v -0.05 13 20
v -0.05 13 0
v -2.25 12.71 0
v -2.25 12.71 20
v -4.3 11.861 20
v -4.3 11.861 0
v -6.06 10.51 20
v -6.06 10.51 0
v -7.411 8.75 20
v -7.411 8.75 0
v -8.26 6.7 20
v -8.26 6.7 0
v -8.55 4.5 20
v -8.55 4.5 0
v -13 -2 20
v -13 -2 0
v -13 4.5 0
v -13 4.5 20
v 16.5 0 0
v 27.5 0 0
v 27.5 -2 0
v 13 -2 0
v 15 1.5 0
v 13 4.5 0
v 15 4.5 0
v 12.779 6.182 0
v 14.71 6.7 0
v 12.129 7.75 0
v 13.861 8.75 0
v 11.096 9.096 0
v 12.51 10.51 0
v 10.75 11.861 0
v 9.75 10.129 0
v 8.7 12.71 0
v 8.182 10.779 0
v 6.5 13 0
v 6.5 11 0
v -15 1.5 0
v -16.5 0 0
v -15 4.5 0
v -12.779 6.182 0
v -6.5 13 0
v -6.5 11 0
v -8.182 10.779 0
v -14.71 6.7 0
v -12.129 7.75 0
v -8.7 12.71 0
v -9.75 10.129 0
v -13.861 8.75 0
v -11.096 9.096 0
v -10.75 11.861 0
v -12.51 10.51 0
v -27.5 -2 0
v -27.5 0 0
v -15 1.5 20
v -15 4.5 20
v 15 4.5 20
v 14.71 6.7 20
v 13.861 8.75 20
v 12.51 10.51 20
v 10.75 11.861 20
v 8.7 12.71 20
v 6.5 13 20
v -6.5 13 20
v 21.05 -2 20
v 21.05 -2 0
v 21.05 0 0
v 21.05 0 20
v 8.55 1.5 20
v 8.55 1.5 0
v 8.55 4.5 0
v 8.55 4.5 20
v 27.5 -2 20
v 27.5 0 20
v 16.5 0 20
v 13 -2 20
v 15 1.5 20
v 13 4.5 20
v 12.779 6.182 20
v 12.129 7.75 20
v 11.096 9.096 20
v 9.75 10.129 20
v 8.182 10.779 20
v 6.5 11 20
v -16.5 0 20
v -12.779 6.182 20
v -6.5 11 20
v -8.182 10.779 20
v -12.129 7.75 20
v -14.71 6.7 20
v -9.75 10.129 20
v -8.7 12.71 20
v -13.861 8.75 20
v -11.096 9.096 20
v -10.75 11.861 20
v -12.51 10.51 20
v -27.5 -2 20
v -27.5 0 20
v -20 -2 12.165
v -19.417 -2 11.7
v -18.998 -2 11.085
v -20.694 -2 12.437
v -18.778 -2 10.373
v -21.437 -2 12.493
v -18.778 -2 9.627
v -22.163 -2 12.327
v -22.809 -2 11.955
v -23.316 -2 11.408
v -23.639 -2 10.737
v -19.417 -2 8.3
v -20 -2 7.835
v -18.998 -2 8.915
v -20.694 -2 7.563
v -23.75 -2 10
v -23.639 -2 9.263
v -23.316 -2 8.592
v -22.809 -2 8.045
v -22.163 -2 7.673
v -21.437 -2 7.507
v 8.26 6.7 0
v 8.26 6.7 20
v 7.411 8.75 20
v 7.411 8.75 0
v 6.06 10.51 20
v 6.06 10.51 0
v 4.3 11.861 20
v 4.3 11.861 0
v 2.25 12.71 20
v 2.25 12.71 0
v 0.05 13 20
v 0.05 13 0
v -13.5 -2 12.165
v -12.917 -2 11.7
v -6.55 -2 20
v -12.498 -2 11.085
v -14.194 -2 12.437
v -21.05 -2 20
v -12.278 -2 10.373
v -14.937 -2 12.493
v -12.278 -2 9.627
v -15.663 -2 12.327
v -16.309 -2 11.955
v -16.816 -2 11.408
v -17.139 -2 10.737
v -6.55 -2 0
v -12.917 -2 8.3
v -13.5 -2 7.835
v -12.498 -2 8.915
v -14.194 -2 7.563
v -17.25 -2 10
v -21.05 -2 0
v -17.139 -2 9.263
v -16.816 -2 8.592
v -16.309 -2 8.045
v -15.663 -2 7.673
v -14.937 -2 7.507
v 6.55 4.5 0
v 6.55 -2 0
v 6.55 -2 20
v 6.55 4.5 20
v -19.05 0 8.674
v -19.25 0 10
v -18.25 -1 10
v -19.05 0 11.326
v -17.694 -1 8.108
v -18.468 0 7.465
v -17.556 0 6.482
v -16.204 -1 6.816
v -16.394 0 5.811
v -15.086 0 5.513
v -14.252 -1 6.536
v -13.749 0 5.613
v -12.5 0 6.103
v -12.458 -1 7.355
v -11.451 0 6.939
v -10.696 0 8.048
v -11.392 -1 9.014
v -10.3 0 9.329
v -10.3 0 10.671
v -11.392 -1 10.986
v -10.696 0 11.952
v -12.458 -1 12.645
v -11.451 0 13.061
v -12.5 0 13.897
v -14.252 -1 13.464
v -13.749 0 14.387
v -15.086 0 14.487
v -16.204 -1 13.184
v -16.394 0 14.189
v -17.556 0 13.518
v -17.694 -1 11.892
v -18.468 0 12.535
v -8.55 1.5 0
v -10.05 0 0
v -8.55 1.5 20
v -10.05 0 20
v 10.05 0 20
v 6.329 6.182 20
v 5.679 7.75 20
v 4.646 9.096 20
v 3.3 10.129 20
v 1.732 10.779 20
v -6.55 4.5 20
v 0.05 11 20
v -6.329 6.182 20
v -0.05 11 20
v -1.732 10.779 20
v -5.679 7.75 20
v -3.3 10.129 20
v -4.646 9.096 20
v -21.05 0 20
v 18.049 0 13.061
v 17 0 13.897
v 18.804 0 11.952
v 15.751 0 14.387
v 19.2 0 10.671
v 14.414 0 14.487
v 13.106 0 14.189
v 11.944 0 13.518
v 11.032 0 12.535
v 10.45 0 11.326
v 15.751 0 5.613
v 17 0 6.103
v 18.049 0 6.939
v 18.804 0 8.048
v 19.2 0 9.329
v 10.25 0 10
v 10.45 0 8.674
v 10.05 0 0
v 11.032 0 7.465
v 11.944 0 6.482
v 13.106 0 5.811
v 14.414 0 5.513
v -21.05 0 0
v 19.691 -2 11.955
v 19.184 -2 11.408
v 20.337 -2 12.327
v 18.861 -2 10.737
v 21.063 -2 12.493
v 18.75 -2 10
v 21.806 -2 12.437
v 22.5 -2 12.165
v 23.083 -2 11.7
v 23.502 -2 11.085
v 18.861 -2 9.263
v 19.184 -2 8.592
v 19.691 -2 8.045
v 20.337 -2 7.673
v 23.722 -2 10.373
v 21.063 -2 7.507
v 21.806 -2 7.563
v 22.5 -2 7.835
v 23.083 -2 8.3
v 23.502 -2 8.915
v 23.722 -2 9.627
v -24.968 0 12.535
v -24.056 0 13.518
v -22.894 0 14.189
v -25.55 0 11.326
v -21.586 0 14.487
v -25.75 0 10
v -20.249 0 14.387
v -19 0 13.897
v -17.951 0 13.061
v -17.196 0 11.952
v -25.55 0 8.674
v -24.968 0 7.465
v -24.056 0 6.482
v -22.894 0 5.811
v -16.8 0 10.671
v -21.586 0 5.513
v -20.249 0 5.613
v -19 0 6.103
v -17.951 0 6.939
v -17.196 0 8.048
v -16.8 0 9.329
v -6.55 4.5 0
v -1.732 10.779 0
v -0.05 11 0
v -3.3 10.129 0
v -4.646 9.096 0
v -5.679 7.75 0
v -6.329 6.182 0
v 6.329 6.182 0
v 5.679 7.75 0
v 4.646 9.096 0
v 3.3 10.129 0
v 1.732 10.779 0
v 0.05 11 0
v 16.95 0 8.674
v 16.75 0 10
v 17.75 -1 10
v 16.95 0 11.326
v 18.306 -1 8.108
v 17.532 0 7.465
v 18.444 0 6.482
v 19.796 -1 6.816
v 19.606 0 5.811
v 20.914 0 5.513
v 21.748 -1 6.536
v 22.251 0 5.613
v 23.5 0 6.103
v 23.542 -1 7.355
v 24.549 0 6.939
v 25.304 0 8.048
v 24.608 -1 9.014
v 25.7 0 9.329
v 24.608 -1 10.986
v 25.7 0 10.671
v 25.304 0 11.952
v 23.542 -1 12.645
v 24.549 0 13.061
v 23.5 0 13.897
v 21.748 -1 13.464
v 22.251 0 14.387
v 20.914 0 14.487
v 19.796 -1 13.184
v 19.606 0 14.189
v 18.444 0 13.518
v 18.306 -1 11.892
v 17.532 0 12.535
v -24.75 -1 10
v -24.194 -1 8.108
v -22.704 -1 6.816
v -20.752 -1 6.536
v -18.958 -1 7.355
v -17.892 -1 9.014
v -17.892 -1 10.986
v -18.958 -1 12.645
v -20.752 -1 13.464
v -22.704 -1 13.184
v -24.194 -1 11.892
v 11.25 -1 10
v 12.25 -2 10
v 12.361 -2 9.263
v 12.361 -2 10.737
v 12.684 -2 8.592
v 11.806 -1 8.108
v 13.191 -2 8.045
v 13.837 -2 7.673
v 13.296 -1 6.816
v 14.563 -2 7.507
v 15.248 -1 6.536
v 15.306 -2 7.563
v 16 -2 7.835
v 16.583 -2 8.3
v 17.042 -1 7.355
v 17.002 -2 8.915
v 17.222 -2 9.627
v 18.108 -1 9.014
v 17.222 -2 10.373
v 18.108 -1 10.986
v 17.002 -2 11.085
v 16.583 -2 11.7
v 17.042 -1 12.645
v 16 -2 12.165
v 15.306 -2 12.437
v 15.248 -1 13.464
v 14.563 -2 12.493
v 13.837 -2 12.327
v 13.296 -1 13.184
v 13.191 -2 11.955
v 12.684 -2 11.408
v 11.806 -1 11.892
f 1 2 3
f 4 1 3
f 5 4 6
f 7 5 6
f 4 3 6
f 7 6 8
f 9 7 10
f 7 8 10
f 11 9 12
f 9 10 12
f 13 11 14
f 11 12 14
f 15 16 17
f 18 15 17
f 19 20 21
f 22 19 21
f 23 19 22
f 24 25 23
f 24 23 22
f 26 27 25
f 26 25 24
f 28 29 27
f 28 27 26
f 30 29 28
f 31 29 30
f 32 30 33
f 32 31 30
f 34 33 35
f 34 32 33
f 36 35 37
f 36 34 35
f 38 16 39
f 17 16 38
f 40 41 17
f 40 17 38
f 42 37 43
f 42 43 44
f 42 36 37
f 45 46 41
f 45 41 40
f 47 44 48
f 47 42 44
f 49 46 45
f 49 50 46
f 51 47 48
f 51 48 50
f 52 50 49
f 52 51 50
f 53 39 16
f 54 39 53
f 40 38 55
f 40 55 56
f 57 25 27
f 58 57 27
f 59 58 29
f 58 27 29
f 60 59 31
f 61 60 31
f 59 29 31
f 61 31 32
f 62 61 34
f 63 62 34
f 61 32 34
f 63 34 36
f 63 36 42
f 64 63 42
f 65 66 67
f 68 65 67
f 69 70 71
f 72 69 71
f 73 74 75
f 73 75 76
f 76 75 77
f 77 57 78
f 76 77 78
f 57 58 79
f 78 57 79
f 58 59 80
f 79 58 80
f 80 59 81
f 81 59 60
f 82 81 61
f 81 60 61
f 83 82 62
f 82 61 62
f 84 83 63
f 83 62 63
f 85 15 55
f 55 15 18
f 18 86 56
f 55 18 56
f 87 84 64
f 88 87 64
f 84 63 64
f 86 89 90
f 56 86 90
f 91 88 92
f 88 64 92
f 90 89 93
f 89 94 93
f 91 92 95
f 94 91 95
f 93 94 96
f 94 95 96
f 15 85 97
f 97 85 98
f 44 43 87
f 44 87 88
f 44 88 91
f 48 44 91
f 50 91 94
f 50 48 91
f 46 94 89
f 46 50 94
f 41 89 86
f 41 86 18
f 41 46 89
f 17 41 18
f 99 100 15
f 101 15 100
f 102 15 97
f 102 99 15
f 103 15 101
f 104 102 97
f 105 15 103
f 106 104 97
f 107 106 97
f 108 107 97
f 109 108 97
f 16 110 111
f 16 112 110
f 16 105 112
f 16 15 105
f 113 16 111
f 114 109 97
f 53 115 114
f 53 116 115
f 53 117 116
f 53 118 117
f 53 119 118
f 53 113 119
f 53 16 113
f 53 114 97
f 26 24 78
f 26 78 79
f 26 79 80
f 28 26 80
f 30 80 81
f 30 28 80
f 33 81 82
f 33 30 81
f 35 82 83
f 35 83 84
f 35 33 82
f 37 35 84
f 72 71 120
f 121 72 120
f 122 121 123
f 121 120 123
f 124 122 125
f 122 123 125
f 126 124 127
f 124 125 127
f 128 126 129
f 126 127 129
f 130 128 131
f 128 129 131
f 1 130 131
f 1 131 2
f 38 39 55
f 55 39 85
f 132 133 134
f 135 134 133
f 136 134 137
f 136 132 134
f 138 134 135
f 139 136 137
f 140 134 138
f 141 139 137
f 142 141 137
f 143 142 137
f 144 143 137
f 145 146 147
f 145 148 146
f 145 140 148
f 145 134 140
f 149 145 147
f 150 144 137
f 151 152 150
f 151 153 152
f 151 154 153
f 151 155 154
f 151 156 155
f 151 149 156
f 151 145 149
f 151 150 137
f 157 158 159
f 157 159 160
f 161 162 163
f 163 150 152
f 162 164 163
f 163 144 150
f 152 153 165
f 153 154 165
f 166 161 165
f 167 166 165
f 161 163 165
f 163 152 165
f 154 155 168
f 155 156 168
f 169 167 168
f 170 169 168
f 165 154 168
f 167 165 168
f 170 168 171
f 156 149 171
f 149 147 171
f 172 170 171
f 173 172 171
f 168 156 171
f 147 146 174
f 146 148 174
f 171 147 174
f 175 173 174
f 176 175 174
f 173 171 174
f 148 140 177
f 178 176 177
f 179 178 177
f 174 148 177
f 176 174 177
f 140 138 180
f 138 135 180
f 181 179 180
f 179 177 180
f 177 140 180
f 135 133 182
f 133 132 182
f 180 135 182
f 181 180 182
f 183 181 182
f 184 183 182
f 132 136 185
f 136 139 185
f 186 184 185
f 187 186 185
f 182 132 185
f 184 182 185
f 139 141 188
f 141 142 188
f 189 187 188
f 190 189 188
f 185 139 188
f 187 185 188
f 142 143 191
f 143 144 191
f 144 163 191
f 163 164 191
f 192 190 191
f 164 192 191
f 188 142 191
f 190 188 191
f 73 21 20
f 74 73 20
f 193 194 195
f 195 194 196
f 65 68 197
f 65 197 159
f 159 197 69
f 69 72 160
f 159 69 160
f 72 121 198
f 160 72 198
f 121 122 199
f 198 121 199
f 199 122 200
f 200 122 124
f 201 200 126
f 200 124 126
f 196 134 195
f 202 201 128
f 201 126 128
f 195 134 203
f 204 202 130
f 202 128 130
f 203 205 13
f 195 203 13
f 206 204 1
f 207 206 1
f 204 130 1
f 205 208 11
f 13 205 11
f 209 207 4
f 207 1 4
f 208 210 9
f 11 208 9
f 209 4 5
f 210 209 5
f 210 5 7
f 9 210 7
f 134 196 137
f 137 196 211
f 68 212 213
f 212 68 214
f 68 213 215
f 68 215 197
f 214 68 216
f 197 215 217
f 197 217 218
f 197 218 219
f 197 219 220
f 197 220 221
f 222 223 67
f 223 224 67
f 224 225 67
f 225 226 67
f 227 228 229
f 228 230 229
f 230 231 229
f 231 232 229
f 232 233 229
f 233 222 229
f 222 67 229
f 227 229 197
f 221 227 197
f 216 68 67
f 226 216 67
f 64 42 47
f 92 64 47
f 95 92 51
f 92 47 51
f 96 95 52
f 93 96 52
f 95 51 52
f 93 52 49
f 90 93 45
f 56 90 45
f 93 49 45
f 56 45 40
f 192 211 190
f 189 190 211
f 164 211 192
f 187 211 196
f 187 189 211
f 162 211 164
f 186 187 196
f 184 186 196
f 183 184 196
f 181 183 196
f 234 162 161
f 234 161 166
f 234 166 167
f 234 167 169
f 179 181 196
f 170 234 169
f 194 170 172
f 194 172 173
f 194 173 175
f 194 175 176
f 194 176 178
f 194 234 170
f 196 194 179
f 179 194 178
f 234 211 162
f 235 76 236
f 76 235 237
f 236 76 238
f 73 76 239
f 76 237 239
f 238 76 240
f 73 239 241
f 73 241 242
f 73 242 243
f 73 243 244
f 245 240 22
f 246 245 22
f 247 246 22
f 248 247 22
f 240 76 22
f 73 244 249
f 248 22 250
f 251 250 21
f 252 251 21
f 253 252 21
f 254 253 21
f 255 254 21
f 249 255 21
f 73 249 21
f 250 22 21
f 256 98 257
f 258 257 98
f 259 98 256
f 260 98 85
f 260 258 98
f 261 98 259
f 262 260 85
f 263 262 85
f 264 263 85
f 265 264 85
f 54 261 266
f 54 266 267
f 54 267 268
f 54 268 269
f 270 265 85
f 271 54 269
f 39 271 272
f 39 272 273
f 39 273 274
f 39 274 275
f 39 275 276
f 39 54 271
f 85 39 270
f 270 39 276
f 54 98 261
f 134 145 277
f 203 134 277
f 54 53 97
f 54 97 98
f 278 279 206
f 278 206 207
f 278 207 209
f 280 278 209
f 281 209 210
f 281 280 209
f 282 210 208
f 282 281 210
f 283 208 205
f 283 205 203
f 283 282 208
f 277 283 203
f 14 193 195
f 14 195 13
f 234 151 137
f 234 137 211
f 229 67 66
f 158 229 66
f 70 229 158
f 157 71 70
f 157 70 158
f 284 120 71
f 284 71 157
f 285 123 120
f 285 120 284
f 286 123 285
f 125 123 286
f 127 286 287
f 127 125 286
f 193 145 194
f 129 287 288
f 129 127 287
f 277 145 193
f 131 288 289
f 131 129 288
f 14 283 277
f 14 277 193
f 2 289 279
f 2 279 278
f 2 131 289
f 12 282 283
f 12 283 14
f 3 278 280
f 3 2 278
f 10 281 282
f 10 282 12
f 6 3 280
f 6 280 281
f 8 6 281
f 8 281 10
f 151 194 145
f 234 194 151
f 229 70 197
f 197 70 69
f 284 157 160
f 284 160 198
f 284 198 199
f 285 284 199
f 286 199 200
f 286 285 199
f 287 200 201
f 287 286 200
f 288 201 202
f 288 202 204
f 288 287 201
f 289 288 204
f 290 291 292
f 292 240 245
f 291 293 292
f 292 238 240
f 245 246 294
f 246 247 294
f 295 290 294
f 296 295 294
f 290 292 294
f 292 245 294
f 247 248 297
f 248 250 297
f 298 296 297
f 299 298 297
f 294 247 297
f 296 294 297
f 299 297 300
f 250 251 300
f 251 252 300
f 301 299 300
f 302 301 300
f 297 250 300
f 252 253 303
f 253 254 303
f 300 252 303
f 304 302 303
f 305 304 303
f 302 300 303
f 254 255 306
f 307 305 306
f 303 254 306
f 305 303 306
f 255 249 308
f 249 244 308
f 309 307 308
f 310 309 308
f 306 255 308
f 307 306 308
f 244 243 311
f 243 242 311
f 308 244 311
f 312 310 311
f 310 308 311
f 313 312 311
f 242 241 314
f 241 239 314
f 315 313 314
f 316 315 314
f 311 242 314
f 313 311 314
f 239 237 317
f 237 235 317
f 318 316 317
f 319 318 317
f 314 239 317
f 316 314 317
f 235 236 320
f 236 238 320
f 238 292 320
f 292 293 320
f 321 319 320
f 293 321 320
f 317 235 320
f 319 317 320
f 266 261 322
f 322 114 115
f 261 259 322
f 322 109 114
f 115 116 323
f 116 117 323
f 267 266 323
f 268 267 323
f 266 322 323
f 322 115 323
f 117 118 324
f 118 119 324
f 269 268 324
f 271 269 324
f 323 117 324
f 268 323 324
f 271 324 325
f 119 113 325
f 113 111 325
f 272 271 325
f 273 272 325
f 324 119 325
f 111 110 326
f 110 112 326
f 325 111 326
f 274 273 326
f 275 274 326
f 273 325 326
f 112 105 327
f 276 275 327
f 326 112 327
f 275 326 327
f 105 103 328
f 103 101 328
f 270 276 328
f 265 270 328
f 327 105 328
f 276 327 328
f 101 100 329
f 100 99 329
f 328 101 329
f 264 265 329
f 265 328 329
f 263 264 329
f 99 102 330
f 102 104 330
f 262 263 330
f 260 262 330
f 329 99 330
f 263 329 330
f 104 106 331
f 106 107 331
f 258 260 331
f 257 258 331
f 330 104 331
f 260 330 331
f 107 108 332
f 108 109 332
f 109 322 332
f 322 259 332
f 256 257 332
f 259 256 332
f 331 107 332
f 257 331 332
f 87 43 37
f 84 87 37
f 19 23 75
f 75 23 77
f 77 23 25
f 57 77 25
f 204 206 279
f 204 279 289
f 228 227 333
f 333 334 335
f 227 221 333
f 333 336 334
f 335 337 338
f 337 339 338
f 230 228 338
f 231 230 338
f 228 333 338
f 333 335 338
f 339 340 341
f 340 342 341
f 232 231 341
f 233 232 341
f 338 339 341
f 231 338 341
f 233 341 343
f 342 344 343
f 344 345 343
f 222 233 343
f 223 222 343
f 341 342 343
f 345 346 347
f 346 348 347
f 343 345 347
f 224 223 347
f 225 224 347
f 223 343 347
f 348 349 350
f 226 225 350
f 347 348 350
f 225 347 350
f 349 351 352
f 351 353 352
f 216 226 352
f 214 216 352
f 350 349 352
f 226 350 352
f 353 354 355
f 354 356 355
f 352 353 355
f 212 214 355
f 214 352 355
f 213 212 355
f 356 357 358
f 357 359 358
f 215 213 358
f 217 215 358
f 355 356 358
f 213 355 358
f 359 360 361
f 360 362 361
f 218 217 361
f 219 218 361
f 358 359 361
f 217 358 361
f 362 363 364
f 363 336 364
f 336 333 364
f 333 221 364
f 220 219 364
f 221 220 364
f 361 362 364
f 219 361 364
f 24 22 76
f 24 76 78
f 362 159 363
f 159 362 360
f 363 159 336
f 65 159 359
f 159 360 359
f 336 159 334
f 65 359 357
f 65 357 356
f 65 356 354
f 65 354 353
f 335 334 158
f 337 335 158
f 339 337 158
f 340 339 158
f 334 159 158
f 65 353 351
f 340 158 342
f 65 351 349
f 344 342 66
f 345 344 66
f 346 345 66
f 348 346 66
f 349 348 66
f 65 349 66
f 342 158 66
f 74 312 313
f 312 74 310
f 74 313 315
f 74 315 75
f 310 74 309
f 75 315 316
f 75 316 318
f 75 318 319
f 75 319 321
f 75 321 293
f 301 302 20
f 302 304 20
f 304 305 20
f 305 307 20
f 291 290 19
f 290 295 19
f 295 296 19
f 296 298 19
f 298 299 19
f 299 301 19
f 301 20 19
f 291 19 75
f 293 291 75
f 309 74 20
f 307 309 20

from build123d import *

# Parameters (mm, degrees)
PAD_DEPTH           = 20
HOLE_D              = 5
HOLE_DEPTH          = 25
HOLE_CSINK_D        = 9
HOLE_CSINK_ANGLE    = 90
CHAMFER_SIZE        = 1.5
PAD001_DEPTH        = 20
HOLE001_D           = 5
HOLE001_DEPTH       = 25
HOLE001_CSINK_D     = 9
HOLE001_CSINK_ANGLE = 90
CHAMFER001_SIZE     = 1.5


with BuildPart() as bodydouble:
    # Sketch → Pad (new body)
    with BuildSketch(Plane.XY):
        with BuildLine():
            ThreePointArc((-6.5, 11), (-11.096194, 9.096194), (-13, 4.5))
            Line((-13, -2), (-13, 4.5))
            Line((-13, -2), (-27.5, -2))
            Line((-27.5, -2), (-27.5, 0))
            Line((-27.5, 0), (-15, 0))
            Line((-15, 0), (-15, 4.5))
            ThreePointArc((-6.5, 13), (-12.510408, 10.510408), (-15, 4.5))
            Line((-6.5, 13), (0, 13))
            Line((6.5, 13), (0, 13))
            ThreePointArc((15, 4.5), (12.510408, 10.510408), (6.5, 13))
            Line((15, 0), (15, 4.5))
            Line((27.5, 0), (15, 0))
            Line((27.5, -2), (27.5, 0))
            Line((13, -2), (27.5, -2))
            Line((13, -2), (13, 4.5))
            ThreePointArc((13, 4.5), (11.096194, 9.096194), (6.5, 11))
            Line((6.5, 11), (0, 11))
            Line((-6.5, 11), (0, 11))
        make_face()
    extrude(amount=PAD_DEPTH)

    # Hole
    with Locations(Plane(origin=(0, 0, 0), x_dir=(1, 0, 0), z_dir=(0, 1, 0))):
        with Locations((-21.25, -10), (21.25, -10)):
            CounterSinkHole(HOLE_D / 2, HOLE_CSINK_D / 2, depth=HOLE_DEPTH, counter_sink_angle=HOLE_CSINK_ANGLE)

    # Chamfer
    chamfer_edges = [bodydouble.edges().sort_by_distance(p)[0] for p in [
        (15, 0, 10),
        (-15, 0, 10),
    ]]
    chamfer(chamfer_edges, length=CHAMFER_SIZE)


with BuildPart() as bodysingle:
    # Sketch002 → Pad001 (new body)
    with BuildSketch(Plane.XY):
        with BuildLine():
            ThreePointArc((-0.05, 11), (-4.646194, 9.096194), (-6.55, 4.5))
            Line((-6.55, -2), (-6.55, 4.5))
            Line((-6.55, -2), (-21.05, -2))
            Line((-21.05, -2), (-21.05, 0))
            Line((-21.05, 0), (-8.55, 0))
            Line((-8.55, 0), (-8.55, 4.5))
            ThreePointArc((-0.05, 13), (-6.060408, 10.510408), (-8.55, 4.5))
            Line((-0.05, 13), (0, 13))
            Line((0.05, 13), (0, 13))
            ThreePointArc((8.55, 4.5), (6.060408, 10.510408), (0.05, 13))
            Line((8.55, 0), (8.55, 4.5))
            Line((21.05, 0), (8.55, 0))
            Line((21.05, -2), (21.05, 0))
            Line((6.55, -2), (21.05, -2))
            Line((6.55, -2), (6.55, 4.5))
            ThreePointArc((6.55, 4.5), (4.646194, 9.096194), (0.05, 11))
            Line((0.05, 11), (0, 11))
            Line((-0.05, 11), (0, 11))
        make_face()
    extrude(amount=PAD001_DEPTH)

    # Hole001
    with Locations(Plane(origin=(0, 0, 0), x_dir=(1, 0, 0), z_dir=(0, 1, 0))):
        with Locations((-14.75, -10), (14.75, -10)):
            CounterSinkHole(HOLE001_D / 2, HOLE001_CSINK_D / 2, depth=HOLE001_DEPTH, counter_sink_angle=HOLE001_CSINK_ANGLE)

    # Chamfer001
    chamfer001_edges = [bodysingle.edges().sort_by_distance(p)[0] for p in [
        (8.55, 0, 10),
        (-8.55, 0, 10),
    ]]
    chamfer(chamfer001_edges, length=CHAMFER001_SIZE)


solid = Compound([bodydouble.part, bodysingle.part])
